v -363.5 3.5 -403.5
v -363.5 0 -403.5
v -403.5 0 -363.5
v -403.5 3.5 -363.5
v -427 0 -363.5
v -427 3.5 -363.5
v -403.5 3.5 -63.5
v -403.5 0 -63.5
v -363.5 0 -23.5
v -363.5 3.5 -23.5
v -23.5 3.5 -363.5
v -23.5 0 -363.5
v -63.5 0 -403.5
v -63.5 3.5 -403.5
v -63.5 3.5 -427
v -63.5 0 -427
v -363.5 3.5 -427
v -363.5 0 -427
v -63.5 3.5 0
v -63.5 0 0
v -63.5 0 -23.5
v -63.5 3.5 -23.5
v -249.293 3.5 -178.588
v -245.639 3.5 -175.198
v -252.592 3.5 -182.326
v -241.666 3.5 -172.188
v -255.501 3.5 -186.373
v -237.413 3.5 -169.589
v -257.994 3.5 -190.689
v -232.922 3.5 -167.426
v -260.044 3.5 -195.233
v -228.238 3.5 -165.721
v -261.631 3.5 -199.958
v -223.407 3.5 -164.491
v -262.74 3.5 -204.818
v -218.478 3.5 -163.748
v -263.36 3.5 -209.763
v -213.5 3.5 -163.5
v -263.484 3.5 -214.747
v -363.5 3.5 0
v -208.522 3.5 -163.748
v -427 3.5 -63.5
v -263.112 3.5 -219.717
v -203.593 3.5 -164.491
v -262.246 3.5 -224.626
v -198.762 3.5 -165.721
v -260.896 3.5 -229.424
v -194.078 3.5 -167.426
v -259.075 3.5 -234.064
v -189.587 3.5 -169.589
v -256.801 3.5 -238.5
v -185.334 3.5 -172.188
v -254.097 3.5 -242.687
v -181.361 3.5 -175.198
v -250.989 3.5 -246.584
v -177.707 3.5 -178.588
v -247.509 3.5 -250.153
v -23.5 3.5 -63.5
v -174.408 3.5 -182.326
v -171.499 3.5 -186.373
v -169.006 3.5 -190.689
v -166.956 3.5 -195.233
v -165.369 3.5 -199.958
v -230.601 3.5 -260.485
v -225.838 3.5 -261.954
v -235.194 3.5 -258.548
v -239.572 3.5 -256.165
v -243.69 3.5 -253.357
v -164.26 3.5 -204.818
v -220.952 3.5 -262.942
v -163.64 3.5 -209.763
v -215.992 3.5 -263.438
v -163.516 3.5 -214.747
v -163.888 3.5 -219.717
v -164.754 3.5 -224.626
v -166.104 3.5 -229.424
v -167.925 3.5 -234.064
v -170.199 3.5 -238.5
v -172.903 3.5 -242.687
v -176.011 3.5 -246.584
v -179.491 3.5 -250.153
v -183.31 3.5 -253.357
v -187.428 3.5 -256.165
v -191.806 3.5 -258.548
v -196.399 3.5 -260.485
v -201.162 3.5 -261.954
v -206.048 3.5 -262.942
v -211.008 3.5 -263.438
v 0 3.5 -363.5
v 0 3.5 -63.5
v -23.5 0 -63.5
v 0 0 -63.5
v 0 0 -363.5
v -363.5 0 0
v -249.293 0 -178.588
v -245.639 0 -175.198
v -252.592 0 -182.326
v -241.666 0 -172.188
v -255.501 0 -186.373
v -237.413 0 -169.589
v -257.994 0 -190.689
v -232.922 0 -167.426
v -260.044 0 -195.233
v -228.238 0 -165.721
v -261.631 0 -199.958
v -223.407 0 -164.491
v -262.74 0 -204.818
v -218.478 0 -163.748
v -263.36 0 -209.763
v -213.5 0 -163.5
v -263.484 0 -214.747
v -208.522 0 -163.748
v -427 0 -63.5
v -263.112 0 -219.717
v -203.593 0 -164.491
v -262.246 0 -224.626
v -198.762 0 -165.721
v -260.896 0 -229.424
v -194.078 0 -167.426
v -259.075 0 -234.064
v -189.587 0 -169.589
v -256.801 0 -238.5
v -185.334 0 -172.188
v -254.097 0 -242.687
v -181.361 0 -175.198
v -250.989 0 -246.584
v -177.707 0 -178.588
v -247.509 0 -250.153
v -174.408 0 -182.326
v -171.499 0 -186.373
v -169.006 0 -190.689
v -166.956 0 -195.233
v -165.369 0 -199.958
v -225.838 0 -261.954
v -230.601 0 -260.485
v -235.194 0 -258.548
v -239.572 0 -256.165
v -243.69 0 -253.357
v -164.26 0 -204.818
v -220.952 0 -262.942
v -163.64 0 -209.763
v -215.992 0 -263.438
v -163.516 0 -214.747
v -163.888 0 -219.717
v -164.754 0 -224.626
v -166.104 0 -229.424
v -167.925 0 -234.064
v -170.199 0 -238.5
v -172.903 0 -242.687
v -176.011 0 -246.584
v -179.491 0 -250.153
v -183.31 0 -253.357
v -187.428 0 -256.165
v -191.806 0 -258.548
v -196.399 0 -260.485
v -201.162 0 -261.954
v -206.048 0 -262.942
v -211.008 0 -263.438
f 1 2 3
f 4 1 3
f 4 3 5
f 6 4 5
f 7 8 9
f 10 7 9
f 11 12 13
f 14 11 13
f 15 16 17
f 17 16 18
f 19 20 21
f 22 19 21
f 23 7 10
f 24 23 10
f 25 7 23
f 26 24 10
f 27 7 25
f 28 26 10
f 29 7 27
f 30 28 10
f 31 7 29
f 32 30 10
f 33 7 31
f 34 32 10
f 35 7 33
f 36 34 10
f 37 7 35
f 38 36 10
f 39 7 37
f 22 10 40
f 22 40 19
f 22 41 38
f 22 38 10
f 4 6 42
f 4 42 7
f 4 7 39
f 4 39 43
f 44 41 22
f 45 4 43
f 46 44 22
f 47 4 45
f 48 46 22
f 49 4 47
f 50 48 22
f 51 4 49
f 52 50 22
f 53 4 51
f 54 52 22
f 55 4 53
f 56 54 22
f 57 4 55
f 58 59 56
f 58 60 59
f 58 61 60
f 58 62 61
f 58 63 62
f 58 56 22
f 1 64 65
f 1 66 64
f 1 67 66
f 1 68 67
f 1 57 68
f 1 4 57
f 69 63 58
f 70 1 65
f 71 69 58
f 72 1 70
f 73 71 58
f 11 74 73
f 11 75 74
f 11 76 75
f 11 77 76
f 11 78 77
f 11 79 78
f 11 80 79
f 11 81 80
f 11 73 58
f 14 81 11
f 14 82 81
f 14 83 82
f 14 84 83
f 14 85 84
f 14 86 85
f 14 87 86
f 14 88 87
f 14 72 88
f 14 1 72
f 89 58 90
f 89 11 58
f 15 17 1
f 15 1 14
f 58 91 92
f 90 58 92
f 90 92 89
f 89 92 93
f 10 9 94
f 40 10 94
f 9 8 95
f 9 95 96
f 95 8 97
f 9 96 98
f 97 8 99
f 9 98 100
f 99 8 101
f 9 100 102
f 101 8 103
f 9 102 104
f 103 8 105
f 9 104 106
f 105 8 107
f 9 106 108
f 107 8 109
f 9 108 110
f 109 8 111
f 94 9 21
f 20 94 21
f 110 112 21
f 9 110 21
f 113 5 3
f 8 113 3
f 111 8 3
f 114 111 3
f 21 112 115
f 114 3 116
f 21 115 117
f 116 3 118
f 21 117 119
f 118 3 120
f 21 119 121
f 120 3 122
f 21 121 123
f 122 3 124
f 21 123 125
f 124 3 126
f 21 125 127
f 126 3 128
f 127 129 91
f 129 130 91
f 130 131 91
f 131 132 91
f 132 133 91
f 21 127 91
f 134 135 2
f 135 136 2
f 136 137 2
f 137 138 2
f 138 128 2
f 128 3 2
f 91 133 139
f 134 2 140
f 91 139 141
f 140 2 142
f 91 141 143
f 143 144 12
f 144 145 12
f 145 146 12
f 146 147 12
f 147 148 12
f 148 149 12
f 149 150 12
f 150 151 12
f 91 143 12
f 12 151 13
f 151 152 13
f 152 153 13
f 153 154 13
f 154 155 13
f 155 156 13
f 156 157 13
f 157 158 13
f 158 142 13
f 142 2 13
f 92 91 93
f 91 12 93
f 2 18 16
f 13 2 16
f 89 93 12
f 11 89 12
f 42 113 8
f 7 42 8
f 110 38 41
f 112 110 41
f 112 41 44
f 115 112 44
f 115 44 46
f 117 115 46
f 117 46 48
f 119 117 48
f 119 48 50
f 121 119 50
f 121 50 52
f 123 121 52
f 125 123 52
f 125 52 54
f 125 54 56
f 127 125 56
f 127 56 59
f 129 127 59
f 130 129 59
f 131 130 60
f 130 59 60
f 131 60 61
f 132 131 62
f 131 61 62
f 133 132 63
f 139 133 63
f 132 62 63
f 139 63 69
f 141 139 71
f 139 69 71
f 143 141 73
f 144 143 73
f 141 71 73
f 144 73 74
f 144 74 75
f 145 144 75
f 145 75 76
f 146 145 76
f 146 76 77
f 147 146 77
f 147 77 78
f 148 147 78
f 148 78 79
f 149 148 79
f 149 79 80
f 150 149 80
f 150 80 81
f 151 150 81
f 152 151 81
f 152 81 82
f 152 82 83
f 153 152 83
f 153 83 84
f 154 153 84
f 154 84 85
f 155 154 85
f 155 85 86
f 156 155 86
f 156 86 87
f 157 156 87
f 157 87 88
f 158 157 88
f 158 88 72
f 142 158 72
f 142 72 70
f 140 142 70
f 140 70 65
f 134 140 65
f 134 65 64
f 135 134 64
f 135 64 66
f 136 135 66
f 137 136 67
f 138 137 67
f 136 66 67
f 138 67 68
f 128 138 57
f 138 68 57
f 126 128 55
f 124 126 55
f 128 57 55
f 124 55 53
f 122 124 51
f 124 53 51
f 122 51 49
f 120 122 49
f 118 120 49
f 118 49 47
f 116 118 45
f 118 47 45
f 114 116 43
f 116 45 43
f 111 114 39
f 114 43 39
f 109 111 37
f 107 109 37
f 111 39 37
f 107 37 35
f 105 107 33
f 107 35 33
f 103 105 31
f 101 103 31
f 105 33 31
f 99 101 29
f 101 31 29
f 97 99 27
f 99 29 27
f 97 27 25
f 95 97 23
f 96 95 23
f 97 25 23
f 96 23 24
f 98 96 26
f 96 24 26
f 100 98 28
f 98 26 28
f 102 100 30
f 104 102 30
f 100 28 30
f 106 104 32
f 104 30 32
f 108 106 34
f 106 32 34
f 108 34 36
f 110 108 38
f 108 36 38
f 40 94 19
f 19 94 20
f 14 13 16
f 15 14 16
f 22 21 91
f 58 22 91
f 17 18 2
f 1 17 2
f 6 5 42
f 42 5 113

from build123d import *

# Parameters (mm, degrees)
BOSS_EXTRUDE1_DEPTH = 3.5
SKETCH2_R           = 50
CUT_EXTRUDE1_DEPTH  = 10


with BuildPart() as part:
    # Sketch1 → Boss-Extrude1 (new body)
    with BuildSketch(Plane(origin=(0, 0, 0), x_dir=(1, 0, 0), z_dir=(0, 1, 0))):
        Polygon((-363.5, 423.5), (-363.5, 403.5), (-403.5, 363.5), (-423.5, 363.5), (-427, 363.5), (-427, 63.5), (-423.5, 63.5), (-403.5, 63.5), (-363.5, 23.5), (-363.5, 3.5), (-363.5, 0), (-63.5, 0), (-63.5, 3.5), (-63.5, 23.5), (-23.5, 63.5), (-3.5, 63.5), (0, 63.5), (0, 363.5), (-3.5, 363.5), (-23.5, 363.5), (-63.5, 403.5), (-63.5, 423.5), (-63.5, 427), (-363.5, 427), align=None)
    extrude(amount=BOSS_EXTRUDE1_DEPTH)

    # Sketch2 → Cut-Extrude1 (cut)
    with BuildSketch(Plane(origin=(0, 3.5, 0), x_dir=(1, 0, 0), z_dir=(0, 1, 0))):
        with Locations(Location((-213.5, 213.5, 0), (0, 0, 270))):
            Circle(SKETCH2_R)
    extrude(amount=-CUT_EXTRUDE1_DEPTH, mode=Mode.SUBTRACT)


solid = part.part
